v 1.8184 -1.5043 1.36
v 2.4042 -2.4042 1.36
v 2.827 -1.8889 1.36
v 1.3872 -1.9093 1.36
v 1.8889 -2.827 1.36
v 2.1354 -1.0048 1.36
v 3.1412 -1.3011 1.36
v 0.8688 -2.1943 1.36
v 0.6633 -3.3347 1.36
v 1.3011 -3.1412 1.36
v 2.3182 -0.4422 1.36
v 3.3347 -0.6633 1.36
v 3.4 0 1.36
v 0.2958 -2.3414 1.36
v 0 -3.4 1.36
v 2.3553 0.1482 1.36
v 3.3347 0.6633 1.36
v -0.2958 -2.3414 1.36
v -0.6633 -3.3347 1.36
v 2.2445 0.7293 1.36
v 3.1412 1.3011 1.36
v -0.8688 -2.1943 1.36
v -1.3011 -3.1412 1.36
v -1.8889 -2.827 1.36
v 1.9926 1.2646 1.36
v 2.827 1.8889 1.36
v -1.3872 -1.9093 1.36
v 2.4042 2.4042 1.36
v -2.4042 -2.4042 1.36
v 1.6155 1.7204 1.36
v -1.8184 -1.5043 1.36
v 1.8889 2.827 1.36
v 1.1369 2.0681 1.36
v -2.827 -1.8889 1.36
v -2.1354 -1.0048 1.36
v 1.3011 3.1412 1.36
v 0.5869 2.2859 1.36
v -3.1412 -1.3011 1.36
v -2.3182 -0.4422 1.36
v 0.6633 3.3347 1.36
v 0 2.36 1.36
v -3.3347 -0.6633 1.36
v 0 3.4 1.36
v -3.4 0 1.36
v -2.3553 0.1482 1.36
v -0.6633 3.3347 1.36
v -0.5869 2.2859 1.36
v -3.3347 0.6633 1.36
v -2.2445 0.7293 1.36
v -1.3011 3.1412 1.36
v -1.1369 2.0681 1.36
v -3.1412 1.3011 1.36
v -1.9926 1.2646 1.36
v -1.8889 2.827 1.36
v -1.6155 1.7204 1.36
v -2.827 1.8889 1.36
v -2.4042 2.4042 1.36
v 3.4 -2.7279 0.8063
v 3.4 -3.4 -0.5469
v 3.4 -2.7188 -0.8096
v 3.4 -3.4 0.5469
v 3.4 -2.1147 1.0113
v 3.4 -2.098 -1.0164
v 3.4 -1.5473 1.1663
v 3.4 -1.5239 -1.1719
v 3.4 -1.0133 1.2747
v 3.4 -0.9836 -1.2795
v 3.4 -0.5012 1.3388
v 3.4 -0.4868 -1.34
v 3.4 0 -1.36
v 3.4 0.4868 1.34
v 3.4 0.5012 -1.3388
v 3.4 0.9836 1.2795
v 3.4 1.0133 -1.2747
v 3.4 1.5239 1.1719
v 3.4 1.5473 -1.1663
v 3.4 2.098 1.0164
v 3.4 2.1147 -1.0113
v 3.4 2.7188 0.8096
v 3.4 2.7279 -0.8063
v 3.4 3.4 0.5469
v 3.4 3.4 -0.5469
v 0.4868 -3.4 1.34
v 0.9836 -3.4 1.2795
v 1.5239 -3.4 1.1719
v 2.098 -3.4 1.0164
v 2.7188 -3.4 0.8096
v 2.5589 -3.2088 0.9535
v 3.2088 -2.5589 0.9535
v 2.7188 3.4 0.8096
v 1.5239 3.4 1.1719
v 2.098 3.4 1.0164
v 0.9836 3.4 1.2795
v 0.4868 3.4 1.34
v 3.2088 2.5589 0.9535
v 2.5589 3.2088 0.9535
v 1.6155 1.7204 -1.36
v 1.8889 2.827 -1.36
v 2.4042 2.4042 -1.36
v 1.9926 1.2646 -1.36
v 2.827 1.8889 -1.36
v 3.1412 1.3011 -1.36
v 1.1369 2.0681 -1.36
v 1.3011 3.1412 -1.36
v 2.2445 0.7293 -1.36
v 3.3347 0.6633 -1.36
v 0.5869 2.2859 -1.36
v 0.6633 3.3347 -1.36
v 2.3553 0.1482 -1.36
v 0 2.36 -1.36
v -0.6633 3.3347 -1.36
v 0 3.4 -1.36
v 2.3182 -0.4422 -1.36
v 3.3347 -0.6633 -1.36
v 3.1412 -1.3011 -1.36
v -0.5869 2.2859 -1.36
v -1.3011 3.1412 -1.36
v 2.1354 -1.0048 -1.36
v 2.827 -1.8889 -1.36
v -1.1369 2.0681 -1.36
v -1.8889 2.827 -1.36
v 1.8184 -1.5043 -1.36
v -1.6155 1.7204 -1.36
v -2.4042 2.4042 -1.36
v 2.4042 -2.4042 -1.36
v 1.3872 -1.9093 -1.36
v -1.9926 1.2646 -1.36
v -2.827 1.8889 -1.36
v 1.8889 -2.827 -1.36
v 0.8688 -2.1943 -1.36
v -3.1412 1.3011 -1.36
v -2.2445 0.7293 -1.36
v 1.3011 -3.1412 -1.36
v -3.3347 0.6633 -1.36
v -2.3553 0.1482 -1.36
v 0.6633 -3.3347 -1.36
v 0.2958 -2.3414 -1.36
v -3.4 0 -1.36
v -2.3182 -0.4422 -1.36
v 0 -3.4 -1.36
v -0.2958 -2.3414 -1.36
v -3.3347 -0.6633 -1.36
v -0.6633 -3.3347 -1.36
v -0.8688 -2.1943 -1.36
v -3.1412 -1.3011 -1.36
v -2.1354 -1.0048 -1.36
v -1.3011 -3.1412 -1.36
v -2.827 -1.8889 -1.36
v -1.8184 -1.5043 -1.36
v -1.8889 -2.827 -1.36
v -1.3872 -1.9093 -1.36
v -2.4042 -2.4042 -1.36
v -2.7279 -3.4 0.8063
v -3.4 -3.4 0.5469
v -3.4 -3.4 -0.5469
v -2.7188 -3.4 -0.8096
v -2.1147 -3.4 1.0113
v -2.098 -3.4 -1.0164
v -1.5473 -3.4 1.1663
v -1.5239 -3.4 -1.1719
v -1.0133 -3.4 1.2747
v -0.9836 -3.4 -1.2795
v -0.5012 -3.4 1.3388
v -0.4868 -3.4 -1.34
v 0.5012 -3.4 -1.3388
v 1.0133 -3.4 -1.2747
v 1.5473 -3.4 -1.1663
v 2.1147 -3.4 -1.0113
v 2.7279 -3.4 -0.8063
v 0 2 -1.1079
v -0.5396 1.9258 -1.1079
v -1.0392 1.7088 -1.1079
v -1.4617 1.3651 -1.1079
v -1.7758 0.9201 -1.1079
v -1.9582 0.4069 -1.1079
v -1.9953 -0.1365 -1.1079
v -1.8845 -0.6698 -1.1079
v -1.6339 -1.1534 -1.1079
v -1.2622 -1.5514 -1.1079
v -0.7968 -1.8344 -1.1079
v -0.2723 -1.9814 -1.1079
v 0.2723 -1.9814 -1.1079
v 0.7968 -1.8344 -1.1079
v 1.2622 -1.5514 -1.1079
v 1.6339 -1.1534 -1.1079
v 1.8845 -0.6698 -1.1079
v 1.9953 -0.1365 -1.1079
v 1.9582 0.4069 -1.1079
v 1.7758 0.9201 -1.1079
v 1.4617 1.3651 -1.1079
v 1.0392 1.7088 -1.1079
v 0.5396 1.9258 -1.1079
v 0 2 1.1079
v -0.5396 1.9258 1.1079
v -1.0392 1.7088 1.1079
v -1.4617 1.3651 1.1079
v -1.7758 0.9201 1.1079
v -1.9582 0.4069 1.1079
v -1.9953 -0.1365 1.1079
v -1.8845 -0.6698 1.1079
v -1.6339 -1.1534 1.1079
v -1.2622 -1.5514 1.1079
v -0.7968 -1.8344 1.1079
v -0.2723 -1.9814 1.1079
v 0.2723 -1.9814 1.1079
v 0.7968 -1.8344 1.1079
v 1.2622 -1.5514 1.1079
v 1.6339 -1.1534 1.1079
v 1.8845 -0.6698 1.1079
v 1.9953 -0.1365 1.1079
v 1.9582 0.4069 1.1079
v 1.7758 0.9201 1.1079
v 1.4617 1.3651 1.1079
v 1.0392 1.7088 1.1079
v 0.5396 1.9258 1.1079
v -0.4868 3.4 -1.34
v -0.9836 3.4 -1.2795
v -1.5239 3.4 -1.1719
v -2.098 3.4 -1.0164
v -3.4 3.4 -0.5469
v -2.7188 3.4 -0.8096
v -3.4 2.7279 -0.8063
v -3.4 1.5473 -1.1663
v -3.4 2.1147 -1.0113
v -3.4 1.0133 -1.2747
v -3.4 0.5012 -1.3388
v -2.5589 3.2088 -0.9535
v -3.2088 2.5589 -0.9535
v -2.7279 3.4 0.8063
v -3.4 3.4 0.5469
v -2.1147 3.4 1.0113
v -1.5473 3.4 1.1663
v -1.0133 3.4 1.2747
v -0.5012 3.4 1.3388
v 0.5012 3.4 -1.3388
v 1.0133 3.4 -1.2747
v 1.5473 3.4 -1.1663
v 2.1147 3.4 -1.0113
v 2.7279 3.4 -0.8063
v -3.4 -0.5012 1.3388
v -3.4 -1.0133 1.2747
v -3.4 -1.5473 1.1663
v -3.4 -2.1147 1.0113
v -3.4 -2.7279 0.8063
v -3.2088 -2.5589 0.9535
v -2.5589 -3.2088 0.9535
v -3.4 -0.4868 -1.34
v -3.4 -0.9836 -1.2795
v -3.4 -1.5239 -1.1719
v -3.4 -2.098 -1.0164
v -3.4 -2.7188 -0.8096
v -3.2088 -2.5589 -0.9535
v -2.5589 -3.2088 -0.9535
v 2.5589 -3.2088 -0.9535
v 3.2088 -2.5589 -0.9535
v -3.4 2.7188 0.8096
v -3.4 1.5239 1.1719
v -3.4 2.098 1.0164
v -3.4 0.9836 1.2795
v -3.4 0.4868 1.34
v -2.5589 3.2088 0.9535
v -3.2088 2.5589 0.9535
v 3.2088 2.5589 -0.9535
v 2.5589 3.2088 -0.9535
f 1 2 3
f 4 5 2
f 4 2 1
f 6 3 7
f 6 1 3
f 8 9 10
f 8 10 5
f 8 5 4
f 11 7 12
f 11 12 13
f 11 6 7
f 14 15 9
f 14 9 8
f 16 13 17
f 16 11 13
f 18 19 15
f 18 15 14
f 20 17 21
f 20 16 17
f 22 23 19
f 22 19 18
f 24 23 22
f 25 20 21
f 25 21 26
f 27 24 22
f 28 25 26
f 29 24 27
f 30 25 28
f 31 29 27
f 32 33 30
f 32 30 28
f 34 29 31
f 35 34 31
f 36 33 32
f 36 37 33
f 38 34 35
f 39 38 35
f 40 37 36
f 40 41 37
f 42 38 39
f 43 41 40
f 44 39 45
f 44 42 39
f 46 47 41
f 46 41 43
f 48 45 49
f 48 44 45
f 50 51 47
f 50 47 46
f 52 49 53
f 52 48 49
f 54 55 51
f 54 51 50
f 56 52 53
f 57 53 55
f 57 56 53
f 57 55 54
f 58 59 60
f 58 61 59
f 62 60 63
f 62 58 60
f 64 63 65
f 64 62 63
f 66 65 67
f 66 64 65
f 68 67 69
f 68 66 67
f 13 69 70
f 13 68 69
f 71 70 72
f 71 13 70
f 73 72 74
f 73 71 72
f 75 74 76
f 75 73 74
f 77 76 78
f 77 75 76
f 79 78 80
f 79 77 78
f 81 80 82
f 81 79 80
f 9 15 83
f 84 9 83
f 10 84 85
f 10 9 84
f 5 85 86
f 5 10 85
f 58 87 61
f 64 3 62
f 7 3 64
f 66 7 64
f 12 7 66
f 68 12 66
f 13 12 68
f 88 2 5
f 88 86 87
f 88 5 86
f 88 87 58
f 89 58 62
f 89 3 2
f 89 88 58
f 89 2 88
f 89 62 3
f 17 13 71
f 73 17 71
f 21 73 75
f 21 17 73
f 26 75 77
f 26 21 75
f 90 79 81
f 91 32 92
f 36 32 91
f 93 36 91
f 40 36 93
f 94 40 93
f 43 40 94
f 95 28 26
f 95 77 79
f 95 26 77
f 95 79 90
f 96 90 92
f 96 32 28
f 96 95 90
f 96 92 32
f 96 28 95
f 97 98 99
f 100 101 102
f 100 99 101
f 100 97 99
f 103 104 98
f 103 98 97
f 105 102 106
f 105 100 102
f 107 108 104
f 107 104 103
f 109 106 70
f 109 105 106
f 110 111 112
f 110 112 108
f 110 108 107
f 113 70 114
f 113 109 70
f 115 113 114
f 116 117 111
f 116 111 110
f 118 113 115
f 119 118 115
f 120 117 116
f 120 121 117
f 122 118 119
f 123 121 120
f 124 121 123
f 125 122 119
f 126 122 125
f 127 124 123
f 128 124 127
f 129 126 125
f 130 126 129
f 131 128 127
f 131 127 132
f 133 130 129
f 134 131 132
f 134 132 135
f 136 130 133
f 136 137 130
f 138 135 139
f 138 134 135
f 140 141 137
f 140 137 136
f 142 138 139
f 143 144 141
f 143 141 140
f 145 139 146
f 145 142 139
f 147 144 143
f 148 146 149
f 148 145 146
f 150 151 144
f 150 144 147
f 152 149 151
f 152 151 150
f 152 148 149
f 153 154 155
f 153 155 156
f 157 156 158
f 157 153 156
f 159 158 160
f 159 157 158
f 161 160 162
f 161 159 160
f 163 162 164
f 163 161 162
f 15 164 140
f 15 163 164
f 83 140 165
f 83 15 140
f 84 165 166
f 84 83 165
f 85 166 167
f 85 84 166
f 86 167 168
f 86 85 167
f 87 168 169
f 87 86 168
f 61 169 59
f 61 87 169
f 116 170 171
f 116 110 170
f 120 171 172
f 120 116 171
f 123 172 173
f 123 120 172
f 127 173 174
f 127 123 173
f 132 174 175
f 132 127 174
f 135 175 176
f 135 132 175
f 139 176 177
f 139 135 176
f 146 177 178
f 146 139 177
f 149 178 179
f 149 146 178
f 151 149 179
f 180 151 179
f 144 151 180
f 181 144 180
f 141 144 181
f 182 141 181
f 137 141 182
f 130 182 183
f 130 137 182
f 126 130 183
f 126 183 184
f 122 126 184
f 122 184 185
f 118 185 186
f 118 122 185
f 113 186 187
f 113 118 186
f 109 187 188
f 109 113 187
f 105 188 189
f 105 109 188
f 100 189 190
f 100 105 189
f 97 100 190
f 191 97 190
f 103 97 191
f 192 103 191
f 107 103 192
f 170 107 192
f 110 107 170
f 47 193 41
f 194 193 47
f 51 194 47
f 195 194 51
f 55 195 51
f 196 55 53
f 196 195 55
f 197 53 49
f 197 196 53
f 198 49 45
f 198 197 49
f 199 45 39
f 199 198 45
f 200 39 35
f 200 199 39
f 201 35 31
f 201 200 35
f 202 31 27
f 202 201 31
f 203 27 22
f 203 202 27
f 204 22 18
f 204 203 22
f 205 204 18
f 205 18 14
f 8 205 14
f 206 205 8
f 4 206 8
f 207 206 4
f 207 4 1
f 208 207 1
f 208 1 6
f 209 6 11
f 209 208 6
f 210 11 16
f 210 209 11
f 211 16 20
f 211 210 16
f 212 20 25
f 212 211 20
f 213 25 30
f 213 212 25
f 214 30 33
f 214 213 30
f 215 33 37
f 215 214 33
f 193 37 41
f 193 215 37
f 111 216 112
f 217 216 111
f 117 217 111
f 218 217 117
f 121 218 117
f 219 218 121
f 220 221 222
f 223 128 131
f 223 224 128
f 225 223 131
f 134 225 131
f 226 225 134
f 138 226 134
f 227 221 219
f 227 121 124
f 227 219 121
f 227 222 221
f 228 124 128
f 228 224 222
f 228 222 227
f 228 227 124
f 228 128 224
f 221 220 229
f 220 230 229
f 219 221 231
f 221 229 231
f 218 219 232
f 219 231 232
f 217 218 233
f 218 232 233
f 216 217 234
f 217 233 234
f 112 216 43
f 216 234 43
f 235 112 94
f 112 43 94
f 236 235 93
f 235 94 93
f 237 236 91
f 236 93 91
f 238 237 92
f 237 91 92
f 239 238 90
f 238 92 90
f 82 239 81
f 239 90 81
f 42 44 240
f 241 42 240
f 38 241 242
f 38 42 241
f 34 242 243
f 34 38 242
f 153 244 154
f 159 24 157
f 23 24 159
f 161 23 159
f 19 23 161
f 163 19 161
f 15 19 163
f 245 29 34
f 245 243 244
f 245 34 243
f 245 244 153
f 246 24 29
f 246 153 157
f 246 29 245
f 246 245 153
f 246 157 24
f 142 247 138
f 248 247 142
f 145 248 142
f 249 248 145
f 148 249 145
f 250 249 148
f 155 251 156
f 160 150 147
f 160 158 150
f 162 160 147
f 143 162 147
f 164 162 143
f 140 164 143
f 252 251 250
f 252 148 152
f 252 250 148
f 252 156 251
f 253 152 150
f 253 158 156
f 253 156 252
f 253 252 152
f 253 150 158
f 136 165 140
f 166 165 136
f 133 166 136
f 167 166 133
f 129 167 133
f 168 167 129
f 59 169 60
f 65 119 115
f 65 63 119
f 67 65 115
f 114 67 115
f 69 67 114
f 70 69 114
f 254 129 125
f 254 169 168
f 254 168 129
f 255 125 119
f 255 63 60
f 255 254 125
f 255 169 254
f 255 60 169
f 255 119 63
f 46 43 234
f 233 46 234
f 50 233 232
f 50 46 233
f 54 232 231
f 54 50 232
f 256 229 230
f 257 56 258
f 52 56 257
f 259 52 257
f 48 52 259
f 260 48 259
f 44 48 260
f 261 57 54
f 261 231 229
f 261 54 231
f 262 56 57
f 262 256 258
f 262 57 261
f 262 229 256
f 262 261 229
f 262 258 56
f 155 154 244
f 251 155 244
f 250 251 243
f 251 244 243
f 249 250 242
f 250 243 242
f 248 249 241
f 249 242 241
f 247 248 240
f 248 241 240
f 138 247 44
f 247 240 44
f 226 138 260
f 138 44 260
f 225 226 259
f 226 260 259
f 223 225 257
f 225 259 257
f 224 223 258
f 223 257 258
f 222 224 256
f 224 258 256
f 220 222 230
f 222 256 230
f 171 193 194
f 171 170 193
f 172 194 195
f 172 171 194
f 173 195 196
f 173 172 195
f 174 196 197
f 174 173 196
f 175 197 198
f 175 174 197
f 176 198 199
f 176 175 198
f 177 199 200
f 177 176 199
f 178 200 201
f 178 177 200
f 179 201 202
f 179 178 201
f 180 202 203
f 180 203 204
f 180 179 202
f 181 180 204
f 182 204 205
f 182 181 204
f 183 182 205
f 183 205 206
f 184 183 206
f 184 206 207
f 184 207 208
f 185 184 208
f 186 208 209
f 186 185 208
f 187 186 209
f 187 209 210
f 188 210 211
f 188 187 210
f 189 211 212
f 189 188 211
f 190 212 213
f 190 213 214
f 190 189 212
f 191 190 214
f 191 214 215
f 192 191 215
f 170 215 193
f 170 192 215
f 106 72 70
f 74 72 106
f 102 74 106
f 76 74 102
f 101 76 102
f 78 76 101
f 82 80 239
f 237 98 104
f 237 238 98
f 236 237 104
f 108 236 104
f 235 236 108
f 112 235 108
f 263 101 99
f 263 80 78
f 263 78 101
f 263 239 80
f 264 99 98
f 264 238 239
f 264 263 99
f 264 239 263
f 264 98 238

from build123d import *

# Parameters (mm, degrees)
SKETCH2_OUTSIDE_W   = 14.88
SKETCH2_OUTSIDE_H   = 14.88
SKETCH2_OUTSIDE_W_2 = 6.8
SKETCH2_OUTSIDE_H_2 = 6.8
CUT_EXTRUDE1_DEPTH  = 1.36


with BuildPart() as part:
    # Sketch1 → Revolve1 (revolve)
    with BuildSketch(Plane(origin=(0, 0, 0), x_dir=(0, 0, -1), z_dir=(1, 0, 0))):
        Polygon((0.436239569, 5), (-0.436239569, 5), (-1.36, 3.4), (-1.36, 2.36), (-1.107925286, 2), (1.107925286, 2), (1.36, 2.36), (1.36, 3.4), align=None)
    revolve(axis=Axis((0, 0, -2), (0, 0, 1)))

    # Sketch2 outside → Cut-Extrude1 (cut, symmetric)
    with BuildSketch(Plane.XY):
        Rectangle(SKETCH2_OUTSIDE_W, SKETCH2_OUTSIDE_H)
        Rectangle(SKETCH2_OUTSIDE_W_2, SKETCH2_OUTSIDE_H_2, mode=Mode.SUBTRACT)
    extrude(amount=CUT_EXTRUDE1_DEPTH, both=True, mode=Mode.SUBTRACT)


solid = part.part
